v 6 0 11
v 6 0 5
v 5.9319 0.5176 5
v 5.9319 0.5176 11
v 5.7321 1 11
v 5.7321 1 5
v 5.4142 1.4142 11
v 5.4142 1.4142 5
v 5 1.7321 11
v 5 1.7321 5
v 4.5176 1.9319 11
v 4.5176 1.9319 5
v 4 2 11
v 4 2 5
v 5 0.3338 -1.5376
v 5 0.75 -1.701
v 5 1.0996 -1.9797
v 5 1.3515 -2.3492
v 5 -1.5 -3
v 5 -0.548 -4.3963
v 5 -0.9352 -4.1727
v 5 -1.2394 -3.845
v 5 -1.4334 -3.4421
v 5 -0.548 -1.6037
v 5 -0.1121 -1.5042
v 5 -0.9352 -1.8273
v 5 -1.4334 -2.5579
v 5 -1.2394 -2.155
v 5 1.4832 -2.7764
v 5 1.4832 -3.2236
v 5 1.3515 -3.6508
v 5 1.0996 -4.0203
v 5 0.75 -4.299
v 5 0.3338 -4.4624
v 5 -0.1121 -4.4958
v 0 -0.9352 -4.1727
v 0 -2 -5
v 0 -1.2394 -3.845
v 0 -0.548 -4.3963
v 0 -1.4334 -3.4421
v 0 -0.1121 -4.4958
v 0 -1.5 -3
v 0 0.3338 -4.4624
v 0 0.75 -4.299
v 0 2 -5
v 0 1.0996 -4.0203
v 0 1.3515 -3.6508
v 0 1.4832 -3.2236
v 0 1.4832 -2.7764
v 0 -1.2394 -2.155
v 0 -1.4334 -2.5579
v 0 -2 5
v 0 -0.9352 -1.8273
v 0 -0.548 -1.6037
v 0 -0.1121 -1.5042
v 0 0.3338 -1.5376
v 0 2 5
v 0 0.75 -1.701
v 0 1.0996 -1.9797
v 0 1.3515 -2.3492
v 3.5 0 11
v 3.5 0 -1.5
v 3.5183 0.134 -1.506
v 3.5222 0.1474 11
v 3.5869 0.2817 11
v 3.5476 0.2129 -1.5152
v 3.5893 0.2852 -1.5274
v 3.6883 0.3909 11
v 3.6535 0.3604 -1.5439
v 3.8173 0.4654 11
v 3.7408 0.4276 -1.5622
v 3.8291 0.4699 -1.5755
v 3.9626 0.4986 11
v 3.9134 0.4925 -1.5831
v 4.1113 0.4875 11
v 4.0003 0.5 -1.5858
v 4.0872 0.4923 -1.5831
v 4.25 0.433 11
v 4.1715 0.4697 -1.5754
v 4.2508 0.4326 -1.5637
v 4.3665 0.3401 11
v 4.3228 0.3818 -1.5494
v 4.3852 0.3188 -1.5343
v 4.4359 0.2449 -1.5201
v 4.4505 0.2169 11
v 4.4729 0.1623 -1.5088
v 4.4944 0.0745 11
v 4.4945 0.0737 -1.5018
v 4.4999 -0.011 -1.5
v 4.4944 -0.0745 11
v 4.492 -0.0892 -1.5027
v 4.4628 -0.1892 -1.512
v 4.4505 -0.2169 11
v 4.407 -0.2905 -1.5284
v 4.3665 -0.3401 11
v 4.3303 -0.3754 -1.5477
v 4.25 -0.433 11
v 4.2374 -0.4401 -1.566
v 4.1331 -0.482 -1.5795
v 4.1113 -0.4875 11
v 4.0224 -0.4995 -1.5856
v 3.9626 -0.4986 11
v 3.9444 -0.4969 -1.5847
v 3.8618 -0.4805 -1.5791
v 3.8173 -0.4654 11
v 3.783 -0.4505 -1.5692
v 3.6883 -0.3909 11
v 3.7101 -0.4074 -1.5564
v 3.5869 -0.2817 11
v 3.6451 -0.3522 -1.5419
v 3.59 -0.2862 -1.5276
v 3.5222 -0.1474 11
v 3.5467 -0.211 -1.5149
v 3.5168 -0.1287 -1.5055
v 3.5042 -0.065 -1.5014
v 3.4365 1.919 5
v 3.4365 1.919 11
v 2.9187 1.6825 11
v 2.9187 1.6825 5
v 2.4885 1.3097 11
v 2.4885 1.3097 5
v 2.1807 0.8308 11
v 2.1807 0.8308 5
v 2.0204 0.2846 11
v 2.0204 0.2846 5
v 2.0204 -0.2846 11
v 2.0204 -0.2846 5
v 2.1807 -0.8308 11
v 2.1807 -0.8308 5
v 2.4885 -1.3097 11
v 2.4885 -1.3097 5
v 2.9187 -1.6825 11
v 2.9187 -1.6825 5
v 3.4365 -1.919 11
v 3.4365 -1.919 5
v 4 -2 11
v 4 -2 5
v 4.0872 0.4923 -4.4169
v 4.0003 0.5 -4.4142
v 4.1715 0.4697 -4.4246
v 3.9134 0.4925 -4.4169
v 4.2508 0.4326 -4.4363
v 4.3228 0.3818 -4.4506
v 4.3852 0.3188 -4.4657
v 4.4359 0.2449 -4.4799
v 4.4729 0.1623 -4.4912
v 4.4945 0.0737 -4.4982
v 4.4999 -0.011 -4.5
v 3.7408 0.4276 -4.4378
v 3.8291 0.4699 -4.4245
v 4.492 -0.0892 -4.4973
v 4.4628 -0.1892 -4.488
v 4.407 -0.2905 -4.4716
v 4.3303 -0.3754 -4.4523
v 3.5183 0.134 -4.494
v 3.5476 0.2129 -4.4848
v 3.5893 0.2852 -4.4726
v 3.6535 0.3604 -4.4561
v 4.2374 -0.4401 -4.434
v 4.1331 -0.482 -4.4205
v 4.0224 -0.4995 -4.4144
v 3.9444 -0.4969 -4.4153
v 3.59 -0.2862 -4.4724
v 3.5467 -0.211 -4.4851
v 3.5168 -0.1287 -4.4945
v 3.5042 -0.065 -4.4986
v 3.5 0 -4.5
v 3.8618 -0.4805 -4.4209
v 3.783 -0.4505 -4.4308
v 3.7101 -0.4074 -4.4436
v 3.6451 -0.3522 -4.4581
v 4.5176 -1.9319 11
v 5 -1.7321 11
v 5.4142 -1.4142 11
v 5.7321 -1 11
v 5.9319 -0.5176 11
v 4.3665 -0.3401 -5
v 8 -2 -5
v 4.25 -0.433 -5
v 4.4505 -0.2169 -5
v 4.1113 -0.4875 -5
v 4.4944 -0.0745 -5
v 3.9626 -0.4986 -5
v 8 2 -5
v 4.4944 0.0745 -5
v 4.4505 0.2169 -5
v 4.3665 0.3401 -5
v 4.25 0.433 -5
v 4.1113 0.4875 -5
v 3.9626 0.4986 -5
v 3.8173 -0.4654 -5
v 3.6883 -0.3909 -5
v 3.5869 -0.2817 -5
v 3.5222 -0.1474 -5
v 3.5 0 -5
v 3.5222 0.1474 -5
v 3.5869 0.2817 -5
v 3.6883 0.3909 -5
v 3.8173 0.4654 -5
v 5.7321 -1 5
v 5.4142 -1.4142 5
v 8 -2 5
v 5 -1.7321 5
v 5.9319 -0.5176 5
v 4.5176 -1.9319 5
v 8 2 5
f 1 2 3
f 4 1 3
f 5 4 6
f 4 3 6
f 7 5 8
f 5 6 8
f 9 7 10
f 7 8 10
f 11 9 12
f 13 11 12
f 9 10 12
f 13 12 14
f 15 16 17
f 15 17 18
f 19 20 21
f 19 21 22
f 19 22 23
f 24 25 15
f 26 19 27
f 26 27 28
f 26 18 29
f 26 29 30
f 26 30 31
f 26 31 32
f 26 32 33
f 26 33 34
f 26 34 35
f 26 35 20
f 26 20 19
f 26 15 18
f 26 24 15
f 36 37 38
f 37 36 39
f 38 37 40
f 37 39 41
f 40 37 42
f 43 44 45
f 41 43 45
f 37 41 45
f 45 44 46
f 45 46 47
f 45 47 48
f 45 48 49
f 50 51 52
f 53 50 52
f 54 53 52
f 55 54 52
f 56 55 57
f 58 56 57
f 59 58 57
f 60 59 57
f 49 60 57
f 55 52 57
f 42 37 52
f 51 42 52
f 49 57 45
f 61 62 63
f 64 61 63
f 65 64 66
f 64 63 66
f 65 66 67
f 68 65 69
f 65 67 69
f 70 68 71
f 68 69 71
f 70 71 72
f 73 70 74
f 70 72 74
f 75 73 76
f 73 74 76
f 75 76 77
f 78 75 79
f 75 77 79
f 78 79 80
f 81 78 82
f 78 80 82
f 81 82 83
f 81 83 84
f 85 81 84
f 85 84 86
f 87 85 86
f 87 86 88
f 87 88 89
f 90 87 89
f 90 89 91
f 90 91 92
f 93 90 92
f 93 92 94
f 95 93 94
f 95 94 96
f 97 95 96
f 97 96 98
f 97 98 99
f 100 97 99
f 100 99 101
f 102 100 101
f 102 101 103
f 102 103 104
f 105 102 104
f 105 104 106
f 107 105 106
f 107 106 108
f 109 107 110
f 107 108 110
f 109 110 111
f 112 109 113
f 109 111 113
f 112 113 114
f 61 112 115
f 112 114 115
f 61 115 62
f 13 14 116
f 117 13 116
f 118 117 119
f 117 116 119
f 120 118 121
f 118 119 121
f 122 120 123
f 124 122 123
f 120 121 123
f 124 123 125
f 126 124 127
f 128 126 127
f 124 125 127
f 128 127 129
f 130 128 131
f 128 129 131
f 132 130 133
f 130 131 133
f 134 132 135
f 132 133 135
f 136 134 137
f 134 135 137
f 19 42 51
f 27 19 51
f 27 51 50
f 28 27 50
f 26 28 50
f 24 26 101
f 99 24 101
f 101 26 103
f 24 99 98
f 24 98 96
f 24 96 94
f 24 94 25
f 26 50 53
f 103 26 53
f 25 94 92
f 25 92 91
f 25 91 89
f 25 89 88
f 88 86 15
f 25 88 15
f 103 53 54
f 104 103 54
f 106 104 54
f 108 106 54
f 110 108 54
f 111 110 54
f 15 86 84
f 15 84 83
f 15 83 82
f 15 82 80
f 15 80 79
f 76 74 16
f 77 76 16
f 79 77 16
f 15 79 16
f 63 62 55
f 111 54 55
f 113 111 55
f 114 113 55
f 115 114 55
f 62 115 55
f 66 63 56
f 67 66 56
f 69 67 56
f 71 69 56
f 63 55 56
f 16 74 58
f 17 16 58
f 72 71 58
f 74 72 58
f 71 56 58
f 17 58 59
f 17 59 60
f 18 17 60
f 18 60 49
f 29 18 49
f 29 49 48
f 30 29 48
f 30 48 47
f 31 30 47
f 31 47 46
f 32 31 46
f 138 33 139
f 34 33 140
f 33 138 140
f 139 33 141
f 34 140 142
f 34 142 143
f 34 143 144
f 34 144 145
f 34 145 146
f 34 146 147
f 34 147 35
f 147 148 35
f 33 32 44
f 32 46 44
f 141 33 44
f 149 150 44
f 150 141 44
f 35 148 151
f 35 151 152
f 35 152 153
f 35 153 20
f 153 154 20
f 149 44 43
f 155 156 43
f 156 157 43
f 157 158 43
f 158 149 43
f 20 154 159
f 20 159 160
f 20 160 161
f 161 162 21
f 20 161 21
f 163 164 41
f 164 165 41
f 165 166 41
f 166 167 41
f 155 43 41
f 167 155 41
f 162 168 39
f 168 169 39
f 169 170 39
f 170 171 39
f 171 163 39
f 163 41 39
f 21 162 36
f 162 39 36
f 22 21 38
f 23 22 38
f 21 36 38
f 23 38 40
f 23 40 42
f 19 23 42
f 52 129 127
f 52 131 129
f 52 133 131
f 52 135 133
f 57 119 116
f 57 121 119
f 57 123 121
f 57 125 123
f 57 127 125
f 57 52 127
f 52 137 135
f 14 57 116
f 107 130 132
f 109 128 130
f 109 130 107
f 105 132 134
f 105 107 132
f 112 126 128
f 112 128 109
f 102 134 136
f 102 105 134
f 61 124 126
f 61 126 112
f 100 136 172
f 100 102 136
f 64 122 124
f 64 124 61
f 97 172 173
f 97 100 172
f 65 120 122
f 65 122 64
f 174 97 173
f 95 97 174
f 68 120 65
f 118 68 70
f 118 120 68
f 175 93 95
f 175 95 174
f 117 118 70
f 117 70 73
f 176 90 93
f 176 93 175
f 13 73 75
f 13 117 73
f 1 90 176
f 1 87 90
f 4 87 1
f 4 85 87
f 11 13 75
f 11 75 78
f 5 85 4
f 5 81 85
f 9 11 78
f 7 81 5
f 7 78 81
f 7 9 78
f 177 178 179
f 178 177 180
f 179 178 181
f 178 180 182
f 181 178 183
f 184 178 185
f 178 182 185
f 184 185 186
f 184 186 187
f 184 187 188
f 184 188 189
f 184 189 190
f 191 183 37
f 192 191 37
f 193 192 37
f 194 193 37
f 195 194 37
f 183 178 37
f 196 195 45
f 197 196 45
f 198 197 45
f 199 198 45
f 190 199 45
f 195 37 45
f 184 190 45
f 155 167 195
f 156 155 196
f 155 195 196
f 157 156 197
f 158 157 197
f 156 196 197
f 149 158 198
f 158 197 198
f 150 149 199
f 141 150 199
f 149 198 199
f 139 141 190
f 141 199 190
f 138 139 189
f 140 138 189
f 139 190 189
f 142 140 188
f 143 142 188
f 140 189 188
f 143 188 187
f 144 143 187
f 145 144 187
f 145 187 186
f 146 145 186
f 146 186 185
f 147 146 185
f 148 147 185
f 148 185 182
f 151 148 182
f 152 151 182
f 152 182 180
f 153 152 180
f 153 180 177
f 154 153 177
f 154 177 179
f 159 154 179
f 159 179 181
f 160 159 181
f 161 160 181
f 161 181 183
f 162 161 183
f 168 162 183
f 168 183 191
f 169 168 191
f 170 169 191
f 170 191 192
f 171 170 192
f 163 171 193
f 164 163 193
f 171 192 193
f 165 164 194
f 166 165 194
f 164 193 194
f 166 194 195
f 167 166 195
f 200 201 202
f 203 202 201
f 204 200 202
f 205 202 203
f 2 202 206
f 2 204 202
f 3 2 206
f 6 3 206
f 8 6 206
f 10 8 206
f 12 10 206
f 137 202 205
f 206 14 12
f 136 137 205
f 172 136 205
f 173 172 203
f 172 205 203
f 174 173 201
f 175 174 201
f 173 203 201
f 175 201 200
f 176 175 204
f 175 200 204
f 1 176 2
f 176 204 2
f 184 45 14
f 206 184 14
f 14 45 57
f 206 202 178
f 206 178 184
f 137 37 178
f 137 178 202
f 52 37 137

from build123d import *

# Parameters (mm, degrees)
F0_W     = 4
F0_H     = 10
F1_DEPTH = 8
F2_R     = 1.5
F3_DEPTH = 5
F5_DEPTH = 6
F7_D     = 1


with BuildPart() as f1:
    # F0 (on Right) → F1 (new body)
    with BuildSketch(Plane.YZ):
        Rectangle(F0_W, F0_H)
    extrude(amount=F1_DEPTH)

    # F2 (on face) → F3 (cut)
    with BuildSketch(Plane(origin=(0, 0, 0), x_dir=(0, -1, 0), z_dir=(-1, 0, 0))):
        with Locations((0, -3)):
            Circle(F2_R)
    extrude(amount=-F3_DEPTH, mode=Mode.SUBTRACT)

    # F4 (on face) → F5 (join)
    with BuildSketch(Plane.XY.offset(5)):
        with BuildLine():
            ThreePointArc((4, -2), (5.414214, -1.414214), (6, 0))
            ThreePointArc((6, 0), (5.414214, 1.414214), (4, 2))
            ThreePointArc((4, 2), (2, 0), (4, -2))
        make_face()
    extrude(amount=F5_DEPTH)

    # F7 (through all)
    with Locations(Plane.XY.offset(11)):
        with Locations((4, 0)):
            Hole(F7_D / 2)


solid = f1.part
